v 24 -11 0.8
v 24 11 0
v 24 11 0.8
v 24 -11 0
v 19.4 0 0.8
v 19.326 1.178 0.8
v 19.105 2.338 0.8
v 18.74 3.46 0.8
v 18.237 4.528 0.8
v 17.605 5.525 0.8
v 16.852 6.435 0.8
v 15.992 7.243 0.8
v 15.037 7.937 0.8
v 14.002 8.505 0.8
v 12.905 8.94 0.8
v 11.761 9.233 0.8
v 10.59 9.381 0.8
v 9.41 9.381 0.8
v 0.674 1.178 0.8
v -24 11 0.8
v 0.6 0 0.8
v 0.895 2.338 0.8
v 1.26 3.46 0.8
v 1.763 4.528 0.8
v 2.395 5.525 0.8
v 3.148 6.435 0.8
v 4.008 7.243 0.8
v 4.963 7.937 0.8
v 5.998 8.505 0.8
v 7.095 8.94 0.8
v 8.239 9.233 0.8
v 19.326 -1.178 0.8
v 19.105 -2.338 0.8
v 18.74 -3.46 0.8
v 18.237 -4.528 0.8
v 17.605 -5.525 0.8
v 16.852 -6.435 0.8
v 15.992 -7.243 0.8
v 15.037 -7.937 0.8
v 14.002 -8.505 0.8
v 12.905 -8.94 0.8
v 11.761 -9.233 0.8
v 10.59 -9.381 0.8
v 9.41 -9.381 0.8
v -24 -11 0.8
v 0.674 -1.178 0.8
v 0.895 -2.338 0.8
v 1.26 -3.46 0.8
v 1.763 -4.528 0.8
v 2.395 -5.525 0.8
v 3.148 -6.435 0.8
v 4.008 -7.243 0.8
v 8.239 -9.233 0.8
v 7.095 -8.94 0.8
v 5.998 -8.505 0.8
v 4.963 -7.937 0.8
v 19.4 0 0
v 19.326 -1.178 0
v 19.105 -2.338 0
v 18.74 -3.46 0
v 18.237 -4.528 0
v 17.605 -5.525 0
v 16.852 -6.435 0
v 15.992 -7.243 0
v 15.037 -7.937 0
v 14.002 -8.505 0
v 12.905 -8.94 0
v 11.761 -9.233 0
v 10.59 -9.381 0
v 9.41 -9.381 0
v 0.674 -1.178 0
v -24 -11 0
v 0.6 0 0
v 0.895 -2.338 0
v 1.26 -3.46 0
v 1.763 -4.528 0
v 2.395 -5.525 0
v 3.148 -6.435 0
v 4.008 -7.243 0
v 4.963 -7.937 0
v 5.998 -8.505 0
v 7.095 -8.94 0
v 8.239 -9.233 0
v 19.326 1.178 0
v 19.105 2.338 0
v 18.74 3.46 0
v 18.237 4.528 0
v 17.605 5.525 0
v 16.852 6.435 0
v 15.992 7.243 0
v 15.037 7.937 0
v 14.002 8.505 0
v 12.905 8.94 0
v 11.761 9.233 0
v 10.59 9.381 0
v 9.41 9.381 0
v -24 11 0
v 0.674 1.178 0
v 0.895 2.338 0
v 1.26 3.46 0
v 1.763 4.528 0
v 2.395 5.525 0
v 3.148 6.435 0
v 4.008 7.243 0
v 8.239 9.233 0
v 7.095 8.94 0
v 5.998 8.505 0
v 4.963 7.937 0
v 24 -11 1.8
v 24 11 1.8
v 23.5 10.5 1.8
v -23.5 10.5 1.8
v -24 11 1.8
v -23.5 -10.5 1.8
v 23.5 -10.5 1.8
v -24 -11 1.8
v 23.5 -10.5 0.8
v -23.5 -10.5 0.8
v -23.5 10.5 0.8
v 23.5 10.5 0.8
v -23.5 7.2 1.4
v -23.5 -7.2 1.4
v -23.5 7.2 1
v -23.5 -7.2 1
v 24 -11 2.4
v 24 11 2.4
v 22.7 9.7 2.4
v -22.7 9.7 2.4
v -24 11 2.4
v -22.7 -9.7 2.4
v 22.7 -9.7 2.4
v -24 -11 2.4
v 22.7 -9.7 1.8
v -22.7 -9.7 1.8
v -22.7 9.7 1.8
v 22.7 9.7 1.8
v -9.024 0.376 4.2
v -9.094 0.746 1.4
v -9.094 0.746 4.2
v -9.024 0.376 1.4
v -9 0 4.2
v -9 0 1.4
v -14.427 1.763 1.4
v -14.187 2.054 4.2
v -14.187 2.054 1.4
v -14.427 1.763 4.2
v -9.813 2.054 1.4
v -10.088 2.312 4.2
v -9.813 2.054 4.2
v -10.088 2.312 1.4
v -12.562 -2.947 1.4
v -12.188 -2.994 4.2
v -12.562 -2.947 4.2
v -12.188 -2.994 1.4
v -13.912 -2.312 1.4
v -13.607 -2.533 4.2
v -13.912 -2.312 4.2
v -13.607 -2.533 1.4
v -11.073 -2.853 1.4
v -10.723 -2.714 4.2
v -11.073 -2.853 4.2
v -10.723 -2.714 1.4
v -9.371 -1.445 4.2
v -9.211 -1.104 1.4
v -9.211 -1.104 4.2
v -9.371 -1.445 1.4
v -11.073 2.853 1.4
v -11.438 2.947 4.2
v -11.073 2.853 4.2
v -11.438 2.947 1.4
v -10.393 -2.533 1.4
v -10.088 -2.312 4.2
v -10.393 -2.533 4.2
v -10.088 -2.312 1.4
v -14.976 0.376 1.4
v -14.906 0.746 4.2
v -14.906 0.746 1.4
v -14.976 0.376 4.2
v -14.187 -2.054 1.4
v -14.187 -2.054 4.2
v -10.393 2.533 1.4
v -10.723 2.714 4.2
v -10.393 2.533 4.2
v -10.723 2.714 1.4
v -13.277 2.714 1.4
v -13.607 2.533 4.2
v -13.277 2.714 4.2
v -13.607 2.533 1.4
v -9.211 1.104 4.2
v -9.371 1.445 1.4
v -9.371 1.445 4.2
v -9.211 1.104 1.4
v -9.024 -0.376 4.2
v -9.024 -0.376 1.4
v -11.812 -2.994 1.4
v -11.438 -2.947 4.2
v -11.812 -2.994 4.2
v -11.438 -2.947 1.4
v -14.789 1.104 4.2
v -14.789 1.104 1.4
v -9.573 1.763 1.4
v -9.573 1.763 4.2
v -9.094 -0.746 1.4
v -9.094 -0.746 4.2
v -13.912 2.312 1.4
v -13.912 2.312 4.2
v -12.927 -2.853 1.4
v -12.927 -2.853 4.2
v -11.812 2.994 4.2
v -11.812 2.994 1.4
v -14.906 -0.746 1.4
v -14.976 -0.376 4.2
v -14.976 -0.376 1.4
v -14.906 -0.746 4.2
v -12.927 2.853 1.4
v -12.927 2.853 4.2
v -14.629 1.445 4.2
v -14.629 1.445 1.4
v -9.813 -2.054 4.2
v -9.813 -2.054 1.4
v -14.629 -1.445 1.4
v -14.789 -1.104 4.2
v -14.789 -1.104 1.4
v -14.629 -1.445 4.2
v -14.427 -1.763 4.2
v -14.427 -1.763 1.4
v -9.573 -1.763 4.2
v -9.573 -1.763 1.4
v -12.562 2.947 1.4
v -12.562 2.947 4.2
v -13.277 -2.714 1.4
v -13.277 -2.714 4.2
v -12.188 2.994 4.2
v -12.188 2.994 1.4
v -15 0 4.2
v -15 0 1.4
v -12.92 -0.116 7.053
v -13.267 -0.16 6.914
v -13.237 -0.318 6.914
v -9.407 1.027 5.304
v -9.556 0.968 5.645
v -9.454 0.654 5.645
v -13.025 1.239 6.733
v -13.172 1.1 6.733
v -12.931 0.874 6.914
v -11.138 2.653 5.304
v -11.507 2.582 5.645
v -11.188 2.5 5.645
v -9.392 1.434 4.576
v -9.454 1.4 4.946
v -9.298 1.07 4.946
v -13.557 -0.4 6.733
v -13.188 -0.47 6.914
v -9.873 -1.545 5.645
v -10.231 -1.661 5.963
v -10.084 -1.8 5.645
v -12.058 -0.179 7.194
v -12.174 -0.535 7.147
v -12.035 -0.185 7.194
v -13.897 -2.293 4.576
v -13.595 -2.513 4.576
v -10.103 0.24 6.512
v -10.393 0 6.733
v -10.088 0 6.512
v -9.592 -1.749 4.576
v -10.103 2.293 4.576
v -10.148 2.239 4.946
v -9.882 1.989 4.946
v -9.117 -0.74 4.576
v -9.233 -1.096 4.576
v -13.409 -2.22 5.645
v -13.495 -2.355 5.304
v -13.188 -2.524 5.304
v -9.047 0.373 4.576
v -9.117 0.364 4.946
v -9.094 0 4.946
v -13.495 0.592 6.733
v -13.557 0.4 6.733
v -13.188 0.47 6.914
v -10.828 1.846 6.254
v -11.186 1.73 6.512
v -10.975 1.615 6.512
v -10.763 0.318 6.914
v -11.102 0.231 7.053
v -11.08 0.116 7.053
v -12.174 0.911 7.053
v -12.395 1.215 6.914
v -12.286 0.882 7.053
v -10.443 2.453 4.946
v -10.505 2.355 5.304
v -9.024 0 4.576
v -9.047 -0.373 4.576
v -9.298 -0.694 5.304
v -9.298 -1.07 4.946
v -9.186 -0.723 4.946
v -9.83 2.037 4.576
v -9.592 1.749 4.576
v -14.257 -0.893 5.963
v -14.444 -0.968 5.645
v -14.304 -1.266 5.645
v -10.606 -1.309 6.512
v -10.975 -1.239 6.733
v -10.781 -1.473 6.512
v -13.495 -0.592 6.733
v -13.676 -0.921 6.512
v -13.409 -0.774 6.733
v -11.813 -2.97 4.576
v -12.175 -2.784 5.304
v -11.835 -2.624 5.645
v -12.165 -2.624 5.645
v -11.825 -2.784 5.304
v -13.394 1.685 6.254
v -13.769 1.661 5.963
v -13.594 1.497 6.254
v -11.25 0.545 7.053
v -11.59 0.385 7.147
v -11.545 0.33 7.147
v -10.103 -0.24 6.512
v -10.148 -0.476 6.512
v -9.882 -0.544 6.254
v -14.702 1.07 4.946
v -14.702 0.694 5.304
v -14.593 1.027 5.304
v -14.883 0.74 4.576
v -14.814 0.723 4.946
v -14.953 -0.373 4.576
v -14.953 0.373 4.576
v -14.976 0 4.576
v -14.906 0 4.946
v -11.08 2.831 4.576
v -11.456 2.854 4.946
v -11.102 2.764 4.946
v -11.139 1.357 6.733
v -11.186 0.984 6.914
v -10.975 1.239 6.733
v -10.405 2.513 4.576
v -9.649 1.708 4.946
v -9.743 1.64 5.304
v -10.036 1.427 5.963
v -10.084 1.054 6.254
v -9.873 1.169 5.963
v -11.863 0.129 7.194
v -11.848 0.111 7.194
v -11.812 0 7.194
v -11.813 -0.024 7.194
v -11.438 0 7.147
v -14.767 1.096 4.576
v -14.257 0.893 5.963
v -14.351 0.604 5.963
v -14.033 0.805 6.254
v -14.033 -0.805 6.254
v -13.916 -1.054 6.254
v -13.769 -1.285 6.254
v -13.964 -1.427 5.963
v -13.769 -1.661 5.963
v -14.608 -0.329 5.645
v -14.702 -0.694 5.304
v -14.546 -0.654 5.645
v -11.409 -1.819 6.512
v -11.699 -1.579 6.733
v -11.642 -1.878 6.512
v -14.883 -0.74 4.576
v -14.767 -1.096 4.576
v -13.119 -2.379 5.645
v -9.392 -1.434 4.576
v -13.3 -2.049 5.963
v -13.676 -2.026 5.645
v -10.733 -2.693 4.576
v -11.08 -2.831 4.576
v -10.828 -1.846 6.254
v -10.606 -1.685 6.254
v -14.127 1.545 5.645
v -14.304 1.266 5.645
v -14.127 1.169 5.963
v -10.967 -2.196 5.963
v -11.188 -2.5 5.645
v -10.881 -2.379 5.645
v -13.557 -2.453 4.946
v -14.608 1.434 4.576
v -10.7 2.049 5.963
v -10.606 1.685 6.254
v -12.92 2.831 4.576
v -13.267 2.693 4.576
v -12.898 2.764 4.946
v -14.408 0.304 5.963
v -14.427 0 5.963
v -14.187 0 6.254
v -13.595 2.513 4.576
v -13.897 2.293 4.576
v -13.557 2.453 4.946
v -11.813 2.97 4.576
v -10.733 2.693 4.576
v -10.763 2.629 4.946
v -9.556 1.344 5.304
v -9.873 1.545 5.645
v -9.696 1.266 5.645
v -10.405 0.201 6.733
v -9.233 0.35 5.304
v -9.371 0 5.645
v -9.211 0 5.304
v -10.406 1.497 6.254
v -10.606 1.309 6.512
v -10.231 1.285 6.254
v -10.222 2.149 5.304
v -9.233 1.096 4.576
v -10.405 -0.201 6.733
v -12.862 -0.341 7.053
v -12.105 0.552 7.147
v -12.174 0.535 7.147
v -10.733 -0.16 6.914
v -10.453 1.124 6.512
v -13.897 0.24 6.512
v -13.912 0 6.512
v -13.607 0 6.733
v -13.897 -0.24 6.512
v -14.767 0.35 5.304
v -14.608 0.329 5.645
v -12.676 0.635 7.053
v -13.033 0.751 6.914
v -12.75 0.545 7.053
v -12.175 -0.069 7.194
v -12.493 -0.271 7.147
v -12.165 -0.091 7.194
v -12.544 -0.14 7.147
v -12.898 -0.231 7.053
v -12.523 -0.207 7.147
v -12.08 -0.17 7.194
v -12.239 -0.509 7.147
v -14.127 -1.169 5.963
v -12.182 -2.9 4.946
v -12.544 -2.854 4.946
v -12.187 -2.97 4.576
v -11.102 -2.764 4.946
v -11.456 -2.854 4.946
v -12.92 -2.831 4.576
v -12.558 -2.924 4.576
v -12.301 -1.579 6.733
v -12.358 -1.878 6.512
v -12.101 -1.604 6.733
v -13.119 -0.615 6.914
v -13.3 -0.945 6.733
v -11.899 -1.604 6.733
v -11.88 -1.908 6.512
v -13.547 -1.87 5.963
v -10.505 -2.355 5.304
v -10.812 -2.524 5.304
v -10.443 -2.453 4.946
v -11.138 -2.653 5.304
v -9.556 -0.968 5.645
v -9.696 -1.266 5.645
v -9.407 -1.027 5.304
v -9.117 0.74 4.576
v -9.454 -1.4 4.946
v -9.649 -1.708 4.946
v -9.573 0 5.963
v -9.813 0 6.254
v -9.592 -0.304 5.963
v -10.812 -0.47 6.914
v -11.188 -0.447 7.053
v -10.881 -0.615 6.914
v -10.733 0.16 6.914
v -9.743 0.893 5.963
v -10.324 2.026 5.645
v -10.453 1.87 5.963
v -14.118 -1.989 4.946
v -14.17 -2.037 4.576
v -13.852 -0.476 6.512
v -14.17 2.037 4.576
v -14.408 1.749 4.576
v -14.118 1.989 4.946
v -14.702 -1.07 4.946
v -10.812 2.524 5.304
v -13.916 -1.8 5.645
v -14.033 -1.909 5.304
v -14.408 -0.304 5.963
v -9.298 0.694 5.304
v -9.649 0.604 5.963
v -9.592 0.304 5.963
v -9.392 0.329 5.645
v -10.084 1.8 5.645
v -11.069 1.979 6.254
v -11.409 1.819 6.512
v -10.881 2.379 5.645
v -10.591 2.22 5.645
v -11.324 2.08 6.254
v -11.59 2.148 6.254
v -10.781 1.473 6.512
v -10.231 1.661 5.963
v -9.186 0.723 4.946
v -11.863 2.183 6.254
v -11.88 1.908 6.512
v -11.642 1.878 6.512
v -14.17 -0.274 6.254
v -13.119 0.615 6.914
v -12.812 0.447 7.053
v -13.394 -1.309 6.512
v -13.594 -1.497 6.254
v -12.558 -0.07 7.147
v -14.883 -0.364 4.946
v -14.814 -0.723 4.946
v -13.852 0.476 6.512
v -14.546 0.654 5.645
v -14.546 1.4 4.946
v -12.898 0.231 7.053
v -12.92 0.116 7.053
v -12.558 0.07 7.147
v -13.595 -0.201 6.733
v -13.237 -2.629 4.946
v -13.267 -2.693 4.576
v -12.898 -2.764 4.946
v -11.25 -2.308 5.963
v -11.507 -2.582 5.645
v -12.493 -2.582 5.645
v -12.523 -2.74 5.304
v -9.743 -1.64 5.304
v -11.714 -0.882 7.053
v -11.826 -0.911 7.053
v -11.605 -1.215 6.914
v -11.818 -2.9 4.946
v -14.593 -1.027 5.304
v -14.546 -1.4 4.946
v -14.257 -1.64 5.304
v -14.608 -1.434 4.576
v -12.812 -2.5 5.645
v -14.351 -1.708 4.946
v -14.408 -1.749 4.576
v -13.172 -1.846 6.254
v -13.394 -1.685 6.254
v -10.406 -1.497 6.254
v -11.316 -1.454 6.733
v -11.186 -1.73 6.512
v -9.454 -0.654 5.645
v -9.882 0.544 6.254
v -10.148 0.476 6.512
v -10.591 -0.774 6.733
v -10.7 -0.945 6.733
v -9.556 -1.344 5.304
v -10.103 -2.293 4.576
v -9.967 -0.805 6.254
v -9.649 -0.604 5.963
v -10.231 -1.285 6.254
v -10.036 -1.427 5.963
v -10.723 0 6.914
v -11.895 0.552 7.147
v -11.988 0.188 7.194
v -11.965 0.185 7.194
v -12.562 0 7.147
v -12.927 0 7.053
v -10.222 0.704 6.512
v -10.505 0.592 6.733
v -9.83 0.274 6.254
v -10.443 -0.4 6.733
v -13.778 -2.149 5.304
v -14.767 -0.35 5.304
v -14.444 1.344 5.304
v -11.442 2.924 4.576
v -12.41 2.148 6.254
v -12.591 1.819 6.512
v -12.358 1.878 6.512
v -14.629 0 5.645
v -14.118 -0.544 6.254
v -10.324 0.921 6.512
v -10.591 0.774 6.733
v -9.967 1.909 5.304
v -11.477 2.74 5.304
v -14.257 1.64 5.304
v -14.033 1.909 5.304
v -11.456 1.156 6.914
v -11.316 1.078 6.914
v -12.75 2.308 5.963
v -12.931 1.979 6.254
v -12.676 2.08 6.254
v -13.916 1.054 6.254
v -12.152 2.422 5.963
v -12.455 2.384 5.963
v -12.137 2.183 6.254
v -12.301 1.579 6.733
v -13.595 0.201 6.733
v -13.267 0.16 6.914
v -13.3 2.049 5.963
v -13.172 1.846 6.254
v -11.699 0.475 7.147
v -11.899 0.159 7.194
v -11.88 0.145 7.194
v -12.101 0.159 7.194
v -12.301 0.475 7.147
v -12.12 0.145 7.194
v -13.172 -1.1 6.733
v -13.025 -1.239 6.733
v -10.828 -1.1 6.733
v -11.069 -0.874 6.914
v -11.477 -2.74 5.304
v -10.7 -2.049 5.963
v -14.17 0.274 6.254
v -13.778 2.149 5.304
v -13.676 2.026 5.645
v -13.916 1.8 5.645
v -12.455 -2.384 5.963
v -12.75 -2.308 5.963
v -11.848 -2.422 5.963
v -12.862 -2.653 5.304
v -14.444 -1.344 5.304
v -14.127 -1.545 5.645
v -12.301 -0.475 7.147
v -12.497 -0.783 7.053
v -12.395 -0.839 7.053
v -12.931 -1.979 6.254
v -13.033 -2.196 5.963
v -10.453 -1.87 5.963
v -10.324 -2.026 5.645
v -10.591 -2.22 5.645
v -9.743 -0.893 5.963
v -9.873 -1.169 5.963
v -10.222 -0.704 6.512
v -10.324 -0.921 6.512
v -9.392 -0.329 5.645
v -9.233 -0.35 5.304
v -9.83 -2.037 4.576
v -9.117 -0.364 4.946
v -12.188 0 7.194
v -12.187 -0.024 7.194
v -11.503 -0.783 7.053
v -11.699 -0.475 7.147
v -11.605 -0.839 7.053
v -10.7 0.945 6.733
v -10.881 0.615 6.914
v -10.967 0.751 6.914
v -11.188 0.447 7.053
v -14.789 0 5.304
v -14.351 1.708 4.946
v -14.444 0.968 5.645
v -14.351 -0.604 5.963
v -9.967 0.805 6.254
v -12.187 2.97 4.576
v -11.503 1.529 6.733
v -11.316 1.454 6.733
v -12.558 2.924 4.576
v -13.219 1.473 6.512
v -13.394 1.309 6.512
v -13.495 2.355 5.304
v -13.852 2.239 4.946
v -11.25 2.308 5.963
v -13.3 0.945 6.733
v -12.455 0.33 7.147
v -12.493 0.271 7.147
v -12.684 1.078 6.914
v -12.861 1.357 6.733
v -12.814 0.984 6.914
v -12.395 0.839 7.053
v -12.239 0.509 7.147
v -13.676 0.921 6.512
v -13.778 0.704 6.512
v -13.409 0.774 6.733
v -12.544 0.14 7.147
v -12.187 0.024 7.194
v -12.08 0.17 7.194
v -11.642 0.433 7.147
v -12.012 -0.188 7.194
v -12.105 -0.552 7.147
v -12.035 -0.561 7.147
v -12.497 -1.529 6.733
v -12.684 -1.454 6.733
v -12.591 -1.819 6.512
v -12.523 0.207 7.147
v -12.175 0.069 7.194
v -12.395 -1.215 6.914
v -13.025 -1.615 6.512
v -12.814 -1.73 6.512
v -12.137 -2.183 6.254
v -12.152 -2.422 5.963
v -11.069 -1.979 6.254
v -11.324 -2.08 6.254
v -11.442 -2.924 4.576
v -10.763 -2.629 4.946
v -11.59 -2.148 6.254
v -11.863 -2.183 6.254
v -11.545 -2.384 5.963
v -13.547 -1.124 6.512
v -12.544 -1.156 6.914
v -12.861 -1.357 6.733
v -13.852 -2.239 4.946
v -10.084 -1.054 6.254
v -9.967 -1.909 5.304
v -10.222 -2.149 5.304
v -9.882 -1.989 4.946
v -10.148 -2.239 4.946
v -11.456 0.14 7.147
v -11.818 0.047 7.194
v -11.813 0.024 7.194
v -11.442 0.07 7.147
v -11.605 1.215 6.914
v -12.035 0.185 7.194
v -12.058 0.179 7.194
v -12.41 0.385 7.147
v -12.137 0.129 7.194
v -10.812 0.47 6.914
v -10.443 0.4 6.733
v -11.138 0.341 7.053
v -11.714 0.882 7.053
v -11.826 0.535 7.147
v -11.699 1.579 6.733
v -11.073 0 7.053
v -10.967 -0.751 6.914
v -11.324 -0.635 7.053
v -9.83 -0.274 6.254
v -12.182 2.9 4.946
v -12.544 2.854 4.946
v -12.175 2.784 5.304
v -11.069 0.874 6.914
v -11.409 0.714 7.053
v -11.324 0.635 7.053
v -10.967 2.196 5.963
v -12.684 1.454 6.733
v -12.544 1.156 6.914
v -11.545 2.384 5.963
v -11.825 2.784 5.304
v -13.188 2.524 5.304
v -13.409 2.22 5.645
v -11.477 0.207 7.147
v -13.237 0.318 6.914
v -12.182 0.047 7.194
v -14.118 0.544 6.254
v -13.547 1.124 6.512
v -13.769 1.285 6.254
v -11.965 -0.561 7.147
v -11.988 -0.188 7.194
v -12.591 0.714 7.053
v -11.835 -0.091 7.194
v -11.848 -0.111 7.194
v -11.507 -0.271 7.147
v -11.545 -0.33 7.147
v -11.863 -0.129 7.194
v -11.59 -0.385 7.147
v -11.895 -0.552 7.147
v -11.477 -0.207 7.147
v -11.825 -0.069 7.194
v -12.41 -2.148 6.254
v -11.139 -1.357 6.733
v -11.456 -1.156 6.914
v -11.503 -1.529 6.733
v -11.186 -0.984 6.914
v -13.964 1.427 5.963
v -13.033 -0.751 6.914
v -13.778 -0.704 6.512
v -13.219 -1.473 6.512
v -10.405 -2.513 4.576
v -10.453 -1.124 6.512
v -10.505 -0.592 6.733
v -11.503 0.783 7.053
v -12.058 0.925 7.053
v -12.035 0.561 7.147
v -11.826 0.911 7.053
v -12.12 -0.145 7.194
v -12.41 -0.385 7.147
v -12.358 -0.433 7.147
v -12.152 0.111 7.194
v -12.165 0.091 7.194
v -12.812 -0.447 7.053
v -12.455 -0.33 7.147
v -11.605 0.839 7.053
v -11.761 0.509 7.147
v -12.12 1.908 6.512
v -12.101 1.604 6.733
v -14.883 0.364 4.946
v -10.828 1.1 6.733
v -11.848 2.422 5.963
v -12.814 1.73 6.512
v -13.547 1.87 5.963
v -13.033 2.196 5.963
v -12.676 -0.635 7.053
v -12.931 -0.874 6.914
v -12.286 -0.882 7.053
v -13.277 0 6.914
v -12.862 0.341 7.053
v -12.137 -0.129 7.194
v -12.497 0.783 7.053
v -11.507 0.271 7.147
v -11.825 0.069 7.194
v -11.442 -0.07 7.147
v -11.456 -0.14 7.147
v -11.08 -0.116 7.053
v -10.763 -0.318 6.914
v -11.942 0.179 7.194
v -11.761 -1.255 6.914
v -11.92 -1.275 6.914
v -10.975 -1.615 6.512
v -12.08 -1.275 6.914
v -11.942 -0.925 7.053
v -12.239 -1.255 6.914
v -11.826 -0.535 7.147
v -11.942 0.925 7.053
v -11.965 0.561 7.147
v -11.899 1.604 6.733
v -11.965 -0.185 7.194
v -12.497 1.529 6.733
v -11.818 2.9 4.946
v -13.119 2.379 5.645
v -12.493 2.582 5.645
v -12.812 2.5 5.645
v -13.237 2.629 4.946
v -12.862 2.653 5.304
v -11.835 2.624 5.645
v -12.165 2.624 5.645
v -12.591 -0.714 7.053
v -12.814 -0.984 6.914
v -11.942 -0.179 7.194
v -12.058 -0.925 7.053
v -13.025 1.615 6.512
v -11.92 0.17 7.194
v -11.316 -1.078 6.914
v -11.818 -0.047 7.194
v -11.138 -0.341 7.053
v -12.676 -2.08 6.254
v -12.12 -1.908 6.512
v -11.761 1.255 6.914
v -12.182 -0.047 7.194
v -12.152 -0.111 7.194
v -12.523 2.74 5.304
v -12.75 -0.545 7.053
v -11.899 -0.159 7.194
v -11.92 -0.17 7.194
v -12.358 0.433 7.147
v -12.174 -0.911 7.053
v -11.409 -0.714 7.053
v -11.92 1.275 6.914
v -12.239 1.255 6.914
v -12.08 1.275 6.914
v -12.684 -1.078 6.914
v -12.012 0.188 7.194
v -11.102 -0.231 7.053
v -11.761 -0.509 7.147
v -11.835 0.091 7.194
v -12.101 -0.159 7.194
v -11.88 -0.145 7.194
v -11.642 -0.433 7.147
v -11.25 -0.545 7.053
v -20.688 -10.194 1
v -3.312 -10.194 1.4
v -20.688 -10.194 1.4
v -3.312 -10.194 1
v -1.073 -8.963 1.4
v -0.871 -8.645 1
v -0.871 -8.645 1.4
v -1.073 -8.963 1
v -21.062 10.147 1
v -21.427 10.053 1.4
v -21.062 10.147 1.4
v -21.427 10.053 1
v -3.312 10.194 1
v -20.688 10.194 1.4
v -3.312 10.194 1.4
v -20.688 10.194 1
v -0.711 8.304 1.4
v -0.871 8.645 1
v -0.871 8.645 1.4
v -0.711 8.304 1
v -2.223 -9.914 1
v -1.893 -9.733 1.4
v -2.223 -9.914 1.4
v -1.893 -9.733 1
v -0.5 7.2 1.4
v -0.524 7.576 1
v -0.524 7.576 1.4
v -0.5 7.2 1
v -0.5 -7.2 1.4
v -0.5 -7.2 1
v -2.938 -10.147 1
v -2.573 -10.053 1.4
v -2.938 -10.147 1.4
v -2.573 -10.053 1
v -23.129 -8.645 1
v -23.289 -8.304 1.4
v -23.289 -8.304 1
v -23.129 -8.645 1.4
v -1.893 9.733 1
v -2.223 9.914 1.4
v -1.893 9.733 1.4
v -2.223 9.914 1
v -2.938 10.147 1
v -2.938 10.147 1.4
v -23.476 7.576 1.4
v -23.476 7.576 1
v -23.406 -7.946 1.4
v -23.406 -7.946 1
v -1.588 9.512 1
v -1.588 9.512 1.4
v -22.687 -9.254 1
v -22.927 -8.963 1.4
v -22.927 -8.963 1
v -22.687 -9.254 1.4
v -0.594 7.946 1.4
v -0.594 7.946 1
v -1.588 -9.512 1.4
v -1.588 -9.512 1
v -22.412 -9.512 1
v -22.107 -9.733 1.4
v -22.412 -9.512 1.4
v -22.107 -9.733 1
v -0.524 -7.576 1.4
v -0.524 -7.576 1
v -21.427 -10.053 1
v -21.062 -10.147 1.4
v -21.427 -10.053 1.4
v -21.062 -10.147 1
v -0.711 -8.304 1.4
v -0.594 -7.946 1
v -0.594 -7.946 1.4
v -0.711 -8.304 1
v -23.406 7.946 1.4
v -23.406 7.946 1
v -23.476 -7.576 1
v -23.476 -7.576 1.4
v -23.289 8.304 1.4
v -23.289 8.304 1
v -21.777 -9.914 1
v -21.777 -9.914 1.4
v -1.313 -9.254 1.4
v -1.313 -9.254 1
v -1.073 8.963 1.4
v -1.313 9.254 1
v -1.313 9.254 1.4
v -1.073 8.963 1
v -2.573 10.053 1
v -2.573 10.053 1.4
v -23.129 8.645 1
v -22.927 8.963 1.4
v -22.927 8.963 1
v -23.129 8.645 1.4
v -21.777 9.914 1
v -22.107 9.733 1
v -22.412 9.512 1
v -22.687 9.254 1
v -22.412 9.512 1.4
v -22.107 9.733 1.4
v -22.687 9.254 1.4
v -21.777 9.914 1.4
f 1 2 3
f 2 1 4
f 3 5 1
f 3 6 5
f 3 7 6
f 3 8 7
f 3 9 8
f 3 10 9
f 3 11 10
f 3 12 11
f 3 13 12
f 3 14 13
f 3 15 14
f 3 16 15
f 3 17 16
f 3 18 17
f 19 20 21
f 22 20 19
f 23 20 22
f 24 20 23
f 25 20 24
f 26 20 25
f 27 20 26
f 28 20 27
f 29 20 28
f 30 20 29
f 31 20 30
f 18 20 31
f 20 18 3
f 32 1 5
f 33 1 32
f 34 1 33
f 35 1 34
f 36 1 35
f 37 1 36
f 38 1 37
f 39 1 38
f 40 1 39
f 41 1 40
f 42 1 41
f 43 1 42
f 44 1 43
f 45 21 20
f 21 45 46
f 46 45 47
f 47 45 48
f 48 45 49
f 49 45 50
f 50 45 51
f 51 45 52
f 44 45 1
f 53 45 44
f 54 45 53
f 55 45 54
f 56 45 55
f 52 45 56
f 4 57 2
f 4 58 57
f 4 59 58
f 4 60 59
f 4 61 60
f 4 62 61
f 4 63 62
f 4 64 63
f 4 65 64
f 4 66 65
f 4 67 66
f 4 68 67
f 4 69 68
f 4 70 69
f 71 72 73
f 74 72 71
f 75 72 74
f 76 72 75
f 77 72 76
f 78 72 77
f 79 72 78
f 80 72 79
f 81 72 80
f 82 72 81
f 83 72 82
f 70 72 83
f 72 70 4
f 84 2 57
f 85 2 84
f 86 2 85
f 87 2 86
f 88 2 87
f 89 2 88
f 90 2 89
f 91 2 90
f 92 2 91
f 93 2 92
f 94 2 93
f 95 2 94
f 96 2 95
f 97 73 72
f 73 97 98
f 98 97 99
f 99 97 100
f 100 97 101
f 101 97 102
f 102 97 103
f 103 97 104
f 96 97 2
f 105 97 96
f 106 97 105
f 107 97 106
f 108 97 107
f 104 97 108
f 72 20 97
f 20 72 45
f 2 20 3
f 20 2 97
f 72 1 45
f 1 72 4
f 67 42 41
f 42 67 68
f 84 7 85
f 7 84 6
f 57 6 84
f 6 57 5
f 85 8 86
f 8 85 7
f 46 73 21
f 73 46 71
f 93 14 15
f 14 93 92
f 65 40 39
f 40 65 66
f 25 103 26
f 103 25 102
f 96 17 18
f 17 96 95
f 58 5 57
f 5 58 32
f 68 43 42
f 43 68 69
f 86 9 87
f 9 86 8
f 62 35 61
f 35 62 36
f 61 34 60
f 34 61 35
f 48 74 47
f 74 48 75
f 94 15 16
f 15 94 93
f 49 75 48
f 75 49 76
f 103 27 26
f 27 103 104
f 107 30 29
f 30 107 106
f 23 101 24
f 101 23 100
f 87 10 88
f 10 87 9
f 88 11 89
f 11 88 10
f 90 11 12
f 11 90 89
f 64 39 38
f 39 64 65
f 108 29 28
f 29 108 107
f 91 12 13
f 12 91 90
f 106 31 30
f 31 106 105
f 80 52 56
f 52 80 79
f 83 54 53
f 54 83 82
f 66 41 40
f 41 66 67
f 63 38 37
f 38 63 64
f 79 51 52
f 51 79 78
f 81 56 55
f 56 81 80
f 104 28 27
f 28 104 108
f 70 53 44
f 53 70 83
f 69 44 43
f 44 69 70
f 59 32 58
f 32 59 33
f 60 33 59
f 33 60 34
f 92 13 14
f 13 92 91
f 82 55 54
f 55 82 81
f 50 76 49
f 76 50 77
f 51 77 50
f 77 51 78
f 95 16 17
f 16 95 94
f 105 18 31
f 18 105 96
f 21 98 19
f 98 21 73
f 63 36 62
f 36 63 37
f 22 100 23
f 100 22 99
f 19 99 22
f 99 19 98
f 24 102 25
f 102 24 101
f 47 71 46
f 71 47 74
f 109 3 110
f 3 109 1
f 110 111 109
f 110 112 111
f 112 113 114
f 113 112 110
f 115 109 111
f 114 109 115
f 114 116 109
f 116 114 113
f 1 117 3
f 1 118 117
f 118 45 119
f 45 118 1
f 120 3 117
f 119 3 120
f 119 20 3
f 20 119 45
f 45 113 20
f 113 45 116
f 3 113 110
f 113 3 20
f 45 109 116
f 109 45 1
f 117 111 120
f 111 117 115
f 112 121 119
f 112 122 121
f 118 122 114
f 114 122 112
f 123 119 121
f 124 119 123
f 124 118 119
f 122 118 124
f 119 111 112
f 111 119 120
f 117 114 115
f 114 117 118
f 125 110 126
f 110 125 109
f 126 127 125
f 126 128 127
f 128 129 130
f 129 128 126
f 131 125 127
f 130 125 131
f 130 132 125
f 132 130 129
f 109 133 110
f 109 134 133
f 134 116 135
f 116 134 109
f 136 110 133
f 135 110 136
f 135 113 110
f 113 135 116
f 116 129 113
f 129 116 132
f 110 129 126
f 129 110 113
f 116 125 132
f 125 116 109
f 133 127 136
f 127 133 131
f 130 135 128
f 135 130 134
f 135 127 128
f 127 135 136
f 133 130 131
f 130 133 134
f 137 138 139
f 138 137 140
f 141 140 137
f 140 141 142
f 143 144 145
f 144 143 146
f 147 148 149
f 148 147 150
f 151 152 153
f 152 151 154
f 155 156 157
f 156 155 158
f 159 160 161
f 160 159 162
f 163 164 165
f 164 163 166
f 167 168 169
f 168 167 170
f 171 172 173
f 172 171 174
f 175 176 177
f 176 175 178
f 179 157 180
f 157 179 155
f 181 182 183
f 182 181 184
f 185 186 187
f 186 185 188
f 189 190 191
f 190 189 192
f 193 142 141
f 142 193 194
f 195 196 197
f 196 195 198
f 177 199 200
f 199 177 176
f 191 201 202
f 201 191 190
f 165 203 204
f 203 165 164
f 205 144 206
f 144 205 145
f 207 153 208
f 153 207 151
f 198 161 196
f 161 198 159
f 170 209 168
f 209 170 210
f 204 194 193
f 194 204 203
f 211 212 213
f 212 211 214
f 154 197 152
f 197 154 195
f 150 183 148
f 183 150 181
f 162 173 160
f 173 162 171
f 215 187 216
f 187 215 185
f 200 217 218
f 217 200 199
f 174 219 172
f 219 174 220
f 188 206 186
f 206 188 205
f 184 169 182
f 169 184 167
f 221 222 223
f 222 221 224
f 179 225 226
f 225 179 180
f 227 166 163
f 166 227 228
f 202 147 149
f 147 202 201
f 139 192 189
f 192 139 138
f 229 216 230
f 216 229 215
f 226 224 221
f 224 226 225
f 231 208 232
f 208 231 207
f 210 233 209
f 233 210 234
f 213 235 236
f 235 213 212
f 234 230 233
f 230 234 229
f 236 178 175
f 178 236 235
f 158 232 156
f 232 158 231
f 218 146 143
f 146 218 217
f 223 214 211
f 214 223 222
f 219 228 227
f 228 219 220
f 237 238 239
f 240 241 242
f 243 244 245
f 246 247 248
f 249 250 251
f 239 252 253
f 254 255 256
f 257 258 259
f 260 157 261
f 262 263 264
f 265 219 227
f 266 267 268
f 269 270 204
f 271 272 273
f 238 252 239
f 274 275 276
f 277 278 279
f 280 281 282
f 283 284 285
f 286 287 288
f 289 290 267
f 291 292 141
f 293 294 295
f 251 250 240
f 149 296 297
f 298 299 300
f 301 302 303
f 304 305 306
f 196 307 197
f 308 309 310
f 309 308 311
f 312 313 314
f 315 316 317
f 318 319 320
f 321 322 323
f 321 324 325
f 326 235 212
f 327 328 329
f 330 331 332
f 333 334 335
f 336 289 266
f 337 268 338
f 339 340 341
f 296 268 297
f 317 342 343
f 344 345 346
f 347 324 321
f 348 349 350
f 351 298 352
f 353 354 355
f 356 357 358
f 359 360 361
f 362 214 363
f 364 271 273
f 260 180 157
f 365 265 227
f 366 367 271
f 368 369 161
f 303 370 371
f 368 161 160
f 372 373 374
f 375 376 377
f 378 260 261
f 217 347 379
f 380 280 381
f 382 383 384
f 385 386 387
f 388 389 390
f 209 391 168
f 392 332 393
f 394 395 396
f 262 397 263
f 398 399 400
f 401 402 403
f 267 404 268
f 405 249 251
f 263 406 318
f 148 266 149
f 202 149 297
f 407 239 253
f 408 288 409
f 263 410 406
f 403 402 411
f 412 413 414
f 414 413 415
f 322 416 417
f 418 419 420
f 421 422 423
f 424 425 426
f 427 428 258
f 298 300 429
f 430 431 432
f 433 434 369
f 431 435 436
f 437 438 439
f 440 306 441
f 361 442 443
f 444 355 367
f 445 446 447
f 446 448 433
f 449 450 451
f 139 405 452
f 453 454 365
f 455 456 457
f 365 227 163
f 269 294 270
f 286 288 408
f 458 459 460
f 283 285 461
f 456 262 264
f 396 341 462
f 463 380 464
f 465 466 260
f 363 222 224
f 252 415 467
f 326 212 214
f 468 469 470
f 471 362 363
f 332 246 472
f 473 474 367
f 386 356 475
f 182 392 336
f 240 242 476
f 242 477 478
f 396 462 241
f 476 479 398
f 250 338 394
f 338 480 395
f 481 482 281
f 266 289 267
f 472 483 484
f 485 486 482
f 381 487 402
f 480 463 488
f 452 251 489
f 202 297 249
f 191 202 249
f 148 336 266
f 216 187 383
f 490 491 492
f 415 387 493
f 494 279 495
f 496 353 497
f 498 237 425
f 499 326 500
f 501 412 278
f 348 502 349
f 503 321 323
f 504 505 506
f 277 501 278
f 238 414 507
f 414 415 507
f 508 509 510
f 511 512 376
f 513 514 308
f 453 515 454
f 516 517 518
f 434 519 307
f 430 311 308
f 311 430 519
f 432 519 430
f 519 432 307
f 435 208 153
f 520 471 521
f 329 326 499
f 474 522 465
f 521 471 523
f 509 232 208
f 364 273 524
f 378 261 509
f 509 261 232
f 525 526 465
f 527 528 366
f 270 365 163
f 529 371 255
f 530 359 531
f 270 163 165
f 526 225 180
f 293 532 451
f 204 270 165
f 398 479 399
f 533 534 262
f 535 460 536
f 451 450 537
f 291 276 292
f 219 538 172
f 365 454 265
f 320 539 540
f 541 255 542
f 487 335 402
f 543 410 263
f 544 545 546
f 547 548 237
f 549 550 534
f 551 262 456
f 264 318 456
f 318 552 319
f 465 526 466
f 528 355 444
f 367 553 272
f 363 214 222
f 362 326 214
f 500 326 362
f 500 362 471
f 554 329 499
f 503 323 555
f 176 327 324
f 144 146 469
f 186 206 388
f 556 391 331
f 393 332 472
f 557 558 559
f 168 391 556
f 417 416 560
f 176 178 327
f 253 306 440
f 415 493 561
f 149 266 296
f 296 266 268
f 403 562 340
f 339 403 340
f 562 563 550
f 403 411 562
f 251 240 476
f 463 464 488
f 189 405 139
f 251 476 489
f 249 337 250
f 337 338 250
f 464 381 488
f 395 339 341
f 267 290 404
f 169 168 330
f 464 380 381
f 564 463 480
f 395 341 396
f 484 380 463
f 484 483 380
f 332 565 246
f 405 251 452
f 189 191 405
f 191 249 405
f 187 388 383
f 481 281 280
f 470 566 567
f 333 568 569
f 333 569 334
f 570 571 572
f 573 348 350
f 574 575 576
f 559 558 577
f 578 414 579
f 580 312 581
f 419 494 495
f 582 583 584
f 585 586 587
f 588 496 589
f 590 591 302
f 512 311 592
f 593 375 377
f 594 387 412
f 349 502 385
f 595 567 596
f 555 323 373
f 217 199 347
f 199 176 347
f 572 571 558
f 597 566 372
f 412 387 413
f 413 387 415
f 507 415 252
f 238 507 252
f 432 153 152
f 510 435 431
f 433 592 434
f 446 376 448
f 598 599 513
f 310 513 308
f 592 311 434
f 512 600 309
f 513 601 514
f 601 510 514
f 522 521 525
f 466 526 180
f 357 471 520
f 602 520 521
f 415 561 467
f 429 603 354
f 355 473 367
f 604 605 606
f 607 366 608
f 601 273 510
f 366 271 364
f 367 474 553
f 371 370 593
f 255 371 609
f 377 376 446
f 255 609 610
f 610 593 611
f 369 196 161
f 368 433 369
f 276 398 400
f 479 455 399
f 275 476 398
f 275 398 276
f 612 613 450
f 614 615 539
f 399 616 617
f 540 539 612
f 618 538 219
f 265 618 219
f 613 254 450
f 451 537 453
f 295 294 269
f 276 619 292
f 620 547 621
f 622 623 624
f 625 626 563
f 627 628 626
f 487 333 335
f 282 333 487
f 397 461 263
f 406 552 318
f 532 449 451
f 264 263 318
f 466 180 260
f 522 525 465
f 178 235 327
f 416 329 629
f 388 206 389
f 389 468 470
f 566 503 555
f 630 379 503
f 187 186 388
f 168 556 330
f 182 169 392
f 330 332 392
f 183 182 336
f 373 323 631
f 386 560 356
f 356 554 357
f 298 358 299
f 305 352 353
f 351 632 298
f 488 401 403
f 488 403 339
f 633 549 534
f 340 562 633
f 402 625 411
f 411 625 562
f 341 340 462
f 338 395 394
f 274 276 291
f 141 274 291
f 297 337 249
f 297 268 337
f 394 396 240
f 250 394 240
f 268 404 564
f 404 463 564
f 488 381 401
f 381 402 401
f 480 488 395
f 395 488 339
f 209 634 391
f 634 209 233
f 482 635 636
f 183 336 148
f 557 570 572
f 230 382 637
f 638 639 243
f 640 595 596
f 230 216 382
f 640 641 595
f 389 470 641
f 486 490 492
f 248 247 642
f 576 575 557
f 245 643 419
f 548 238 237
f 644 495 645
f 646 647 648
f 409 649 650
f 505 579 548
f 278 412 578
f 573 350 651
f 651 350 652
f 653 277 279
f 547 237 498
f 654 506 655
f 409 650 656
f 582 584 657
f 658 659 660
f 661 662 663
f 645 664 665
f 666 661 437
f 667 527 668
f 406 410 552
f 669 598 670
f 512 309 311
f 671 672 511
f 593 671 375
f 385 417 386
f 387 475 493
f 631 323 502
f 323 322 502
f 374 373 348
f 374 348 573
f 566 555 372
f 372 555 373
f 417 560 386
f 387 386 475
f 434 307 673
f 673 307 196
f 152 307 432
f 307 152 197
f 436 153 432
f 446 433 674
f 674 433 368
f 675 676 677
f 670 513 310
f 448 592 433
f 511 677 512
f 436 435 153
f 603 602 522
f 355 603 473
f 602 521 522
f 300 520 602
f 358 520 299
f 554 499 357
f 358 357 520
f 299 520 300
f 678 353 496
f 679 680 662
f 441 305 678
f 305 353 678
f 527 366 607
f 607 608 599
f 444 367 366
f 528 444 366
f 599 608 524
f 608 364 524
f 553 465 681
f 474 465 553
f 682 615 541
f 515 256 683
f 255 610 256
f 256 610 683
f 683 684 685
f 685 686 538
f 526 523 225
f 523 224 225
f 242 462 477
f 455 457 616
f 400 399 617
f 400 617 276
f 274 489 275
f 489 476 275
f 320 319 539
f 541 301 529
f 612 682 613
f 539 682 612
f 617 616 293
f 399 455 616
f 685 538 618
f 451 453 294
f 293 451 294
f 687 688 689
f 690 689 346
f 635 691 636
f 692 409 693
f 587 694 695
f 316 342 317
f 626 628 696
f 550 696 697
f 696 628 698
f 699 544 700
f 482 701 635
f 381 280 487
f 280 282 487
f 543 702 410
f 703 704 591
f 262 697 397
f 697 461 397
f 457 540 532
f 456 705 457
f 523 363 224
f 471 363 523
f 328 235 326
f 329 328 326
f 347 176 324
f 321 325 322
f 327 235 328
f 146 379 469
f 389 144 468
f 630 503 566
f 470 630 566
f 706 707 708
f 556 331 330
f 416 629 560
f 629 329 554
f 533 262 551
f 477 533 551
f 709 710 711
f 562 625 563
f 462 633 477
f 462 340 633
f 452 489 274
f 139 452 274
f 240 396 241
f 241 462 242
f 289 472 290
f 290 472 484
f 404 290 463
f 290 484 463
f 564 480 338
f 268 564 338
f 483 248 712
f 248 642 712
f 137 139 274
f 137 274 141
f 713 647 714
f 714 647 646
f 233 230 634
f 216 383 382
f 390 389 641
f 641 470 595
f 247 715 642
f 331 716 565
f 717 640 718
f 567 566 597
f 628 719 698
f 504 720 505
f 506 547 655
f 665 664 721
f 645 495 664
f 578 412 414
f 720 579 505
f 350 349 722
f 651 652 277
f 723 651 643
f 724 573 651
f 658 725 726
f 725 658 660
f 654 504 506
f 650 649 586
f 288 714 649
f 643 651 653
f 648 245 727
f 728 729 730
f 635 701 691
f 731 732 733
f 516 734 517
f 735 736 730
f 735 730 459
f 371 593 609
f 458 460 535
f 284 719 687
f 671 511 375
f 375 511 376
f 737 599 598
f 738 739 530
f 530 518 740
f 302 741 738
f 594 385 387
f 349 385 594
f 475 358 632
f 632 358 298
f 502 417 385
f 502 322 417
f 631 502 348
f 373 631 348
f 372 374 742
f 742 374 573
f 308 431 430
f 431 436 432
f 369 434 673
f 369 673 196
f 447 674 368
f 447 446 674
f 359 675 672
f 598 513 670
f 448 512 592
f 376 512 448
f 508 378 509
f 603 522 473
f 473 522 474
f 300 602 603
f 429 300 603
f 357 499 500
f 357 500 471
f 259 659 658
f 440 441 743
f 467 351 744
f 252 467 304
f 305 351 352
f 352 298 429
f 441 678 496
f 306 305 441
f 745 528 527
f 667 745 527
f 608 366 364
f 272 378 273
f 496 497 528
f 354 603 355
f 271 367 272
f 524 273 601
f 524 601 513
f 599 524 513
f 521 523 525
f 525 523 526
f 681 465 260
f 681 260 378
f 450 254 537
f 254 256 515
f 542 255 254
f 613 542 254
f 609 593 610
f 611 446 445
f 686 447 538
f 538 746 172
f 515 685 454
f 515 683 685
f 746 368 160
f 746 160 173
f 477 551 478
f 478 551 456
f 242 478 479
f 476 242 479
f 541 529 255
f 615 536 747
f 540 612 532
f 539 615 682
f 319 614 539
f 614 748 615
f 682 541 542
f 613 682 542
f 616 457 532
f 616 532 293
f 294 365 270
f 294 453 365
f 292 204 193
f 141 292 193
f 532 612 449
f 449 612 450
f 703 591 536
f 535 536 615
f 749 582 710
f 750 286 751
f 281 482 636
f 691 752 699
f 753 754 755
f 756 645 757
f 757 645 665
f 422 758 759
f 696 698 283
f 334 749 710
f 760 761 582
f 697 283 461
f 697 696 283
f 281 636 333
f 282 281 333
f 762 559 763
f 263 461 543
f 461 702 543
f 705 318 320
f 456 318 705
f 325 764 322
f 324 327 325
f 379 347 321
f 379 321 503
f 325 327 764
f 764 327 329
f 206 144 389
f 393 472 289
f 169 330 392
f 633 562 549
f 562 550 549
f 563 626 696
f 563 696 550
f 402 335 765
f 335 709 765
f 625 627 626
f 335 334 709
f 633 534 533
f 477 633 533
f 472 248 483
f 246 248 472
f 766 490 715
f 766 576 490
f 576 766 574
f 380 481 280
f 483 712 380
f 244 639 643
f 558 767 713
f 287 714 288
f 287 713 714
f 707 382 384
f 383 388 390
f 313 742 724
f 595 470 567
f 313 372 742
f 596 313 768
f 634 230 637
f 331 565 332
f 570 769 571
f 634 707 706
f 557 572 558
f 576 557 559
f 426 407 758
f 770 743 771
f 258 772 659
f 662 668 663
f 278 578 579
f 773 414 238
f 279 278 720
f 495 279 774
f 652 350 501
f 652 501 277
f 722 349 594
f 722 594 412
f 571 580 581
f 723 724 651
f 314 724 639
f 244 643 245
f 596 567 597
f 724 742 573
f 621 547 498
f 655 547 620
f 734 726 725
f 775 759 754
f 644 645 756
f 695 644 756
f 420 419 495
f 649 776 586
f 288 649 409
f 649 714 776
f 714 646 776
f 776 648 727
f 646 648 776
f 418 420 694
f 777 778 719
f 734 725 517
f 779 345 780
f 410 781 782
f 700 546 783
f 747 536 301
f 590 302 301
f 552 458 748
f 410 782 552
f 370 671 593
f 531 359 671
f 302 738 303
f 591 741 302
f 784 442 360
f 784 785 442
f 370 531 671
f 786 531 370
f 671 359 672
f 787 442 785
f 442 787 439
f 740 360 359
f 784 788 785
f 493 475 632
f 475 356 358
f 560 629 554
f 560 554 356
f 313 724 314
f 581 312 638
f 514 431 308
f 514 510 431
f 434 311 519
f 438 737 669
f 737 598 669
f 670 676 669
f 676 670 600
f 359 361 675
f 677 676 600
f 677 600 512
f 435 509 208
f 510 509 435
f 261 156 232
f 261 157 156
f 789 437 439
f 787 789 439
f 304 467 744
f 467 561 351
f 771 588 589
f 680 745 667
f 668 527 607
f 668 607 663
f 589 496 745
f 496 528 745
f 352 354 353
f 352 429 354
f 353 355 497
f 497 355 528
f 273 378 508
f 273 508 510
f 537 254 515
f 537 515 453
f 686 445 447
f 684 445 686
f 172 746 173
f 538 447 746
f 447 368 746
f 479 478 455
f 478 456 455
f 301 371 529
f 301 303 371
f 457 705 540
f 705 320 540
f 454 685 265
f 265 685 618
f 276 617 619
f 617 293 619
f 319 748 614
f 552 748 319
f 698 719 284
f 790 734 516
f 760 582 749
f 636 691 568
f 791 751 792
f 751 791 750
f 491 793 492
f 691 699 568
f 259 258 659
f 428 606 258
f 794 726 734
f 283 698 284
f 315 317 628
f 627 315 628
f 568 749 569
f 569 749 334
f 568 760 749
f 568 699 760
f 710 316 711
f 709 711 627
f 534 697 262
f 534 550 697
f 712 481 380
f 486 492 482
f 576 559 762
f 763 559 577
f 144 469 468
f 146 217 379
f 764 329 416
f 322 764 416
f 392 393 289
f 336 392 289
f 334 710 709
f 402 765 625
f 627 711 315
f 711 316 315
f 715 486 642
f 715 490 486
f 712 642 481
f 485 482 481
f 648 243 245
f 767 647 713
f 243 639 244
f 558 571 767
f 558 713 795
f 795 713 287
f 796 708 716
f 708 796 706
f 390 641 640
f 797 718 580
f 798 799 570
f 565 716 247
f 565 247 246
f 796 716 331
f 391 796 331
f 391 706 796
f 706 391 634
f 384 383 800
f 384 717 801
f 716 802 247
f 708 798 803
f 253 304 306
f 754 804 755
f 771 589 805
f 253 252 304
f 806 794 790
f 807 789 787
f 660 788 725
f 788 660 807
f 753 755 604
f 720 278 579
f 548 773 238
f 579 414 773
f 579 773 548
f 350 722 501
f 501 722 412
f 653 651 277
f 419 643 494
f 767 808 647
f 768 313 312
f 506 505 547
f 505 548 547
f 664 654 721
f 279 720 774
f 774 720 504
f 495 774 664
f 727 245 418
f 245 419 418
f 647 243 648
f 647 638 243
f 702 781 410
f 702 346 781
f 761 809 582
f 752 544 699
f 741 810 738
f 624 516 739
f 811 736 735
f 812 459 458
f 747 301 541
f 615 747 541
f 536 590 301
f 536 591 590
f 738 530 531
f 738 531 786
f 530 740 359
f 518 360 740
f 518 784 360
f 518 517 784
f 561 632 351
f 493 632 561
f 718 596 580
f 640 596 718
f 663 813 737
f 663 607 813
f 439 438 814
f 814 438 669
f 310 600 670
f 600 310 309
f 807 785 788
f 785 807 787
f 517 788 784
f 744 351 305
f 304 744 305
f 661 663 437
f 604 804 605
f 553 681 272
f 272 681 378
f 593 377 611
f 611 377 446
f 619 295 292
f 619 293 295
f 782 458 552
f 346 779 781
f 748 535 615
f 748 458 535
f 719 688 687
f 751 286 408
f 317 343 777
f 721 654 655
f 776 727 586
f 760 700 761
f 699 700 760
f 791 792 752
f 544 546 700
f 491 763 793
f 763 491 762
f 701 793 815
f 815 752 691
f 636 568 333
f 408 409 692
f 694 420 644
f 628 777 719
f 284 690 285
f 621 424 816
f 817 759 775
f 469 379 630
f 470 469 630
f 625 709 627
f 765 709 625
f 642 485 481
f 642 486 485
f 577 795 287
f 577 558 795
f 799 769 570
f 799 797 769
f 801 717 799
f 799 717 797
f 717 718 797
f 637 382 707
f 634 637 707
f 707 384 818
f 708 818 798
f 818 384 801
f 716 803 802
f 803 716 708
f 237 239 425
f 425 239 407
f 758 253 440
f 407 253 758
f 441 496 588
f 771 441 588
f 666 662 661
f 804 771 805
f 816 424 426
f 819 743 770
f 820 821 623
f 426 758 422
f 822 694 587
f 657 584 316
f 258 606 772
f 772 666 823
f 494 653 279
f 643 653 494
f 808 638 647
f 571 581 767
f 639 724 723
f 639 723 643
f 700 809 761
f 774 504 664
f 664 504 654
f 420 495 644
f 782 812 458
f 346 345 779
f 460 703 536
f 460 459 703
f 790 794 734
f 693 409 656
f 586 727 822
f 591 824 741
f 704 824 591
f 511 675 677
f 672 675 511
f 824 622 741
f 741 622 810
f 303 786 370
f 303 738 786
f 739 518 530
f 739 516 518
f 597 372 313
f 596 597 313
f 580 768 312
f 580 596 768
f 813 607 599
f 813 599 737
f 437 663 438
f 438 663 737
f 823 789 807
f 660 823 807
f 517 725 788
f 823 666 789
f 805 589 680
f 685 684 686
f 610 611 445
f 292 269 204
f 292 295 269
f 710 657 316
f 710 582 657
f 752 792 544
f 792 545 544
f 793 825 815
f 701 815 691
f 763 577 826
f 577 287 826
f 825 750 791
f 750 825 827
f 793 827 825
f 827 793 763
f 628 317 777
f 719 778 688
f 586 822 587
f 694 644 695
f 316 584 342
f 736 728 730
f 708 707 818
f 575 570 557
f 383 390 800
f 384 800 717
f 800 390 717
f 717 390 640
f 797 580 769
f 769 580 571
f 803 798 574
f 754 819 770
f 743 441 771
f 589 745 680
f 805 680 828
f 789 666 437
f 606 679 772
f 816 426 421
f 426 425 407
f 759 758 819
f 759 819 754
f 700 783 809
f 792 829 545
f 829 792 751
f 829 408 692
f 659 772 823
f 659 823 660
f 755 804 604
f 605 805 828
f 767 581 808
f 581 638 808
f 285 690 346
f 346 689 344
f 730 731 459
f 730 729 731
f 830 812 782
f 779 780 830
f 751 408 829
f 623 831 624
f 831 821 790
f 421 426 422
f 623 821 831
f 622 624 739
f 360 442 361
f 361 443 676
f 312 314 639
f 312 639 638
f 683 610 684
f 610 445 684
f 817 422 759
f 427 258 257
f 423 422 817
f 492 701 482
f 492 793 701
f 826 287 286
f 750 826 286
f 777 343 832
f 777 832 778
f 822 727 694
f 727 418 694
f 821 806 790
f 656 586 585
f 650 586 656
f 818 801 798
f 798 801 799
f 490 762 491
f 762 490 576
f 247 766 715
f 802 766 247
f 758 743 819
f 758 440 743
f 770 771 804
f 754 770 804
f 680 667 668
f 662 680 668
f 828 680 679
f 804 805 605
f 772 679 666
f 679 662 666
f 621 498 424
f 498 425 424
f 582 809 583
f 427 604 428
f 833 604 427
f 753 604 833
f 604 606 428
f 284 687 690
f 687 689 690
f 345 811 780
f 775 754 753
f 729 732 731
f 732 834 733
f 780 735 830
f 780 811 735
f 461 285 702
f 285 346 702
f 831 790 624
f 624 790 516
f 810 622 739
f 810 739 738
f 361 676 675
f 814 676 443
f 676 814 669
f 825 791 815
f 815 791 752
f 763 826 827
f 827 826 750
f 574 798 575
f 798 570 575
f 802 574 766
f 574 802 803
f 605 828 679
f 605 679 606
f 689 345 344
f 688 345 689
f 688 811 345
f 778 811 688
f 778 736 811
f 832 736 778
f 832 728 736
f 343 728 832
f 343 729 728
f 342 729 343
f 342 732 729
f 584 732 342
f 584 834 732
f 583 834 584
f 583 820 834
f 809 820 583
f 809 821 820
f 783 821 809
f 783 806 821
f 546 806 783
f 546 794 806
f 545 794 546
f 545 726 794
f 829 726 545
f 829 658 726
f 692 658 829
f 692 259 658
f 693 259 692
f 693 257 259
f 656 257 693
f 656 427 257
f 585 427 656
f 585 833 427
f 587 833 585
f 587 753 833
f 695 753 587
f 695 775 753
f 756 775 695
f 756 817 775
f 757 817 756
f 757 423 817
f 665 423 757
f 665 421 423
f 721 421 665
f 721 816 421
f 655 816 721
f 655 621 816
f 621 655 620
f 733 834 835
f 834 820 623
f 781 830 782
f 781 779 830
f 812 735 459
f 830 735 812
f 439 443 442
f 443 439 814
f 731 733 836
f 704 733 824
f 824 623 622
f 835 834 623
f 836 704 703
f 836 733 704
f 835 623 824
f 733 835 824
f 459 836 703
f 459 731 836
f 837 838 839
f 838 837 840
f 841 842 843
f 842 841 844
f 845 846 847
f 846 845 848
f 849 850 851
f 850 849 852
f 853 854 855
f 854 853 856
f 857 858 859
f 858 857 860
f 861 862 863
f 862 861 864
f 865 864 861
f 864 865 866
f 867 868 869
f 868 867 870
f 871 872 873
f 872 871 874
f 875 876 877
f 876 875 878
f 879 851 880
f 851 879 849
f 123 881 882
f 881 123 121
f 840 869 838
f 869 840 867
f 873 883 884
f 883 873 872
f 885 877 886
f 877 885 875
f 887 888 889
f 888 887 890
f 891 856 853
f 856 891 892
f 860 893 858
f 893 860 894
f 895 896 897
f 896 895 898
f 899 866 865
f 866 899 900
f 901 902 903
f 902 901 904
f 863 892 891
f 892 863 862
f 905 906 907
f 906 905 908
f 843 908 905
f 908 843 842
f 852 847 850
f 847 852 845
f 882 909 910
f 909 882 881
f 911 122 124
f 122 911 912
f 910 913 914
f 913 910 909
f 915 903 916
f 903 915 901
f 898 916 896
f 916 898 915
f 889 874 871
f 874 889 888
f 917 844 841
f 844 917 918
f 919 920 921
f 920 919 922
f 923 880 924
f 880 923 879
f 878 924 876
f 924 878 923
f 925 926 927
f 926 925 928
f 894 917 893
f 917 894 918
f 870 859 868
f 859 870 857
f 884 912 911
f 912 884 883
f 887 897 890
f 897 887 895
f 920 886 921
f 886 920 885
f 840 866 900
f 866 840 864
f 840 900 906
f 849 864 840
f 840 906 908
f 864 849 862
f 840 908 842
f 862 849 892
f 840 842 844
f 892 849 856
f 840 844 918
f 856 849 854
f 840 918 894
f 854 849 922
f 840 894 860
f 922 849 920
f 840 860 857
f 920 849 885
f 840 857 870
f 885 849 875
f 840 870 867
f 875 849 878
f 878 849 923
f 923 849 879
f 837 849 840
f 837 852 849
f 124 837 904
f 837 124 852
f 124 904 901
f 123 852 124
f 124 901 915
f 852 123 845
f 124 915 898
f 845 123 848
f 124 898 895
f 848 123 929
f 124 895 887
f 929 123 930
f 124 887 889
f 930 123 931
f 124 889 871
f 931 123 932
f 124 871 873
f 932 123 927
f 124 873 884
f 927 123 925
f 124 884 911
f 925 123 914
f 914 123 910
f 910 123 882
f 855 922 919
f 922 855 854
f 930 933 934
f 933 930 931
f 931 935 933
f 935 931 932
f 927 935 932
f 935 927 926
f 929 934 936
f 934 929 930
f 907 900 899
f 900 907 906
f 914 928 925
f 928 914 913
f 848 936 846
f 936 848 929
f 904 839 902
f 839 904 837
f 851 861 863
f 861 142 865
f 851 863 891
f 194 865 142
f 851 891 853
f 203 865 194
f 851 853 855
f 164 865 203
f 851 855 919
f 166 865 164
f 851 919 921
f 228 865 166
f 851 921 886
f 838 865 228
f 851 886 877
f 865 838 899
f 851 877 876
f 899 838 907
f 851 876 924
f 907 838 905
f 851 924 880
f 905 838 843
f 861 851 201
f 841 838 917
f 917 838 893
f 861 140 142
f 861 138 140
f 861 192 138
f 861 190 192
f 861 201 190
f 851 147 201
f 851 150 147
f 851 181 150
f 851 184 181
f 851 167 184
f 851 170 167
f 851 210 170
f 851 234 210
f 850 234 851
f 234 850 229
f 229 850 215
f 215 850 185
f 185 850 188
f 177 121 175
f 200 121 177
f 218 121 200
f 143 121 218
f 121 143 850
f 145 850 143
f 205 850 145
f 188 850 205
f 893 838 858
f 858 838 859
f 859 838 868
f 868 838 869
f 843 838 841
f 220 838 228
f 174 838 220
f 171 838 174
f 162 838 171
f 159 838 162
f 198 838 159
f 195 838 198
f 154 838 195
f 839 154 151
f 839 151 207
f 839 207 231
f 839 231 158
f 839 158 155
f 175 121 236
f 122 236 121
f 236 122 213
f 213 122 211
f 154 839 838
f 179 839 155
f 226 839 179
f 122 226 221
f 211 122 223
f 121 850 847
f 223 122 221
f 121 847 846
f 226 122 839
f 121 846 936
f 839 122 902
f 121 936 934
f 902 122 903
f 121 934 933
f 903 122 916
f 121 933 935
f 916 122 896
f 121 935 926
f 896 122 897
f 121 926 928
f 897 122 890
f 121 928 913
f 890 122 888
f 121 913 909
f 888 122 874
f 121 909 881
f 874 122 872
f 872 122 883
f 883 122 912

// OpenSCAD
// file: Switch.scad
$fn=50;

sliderX=23;
sliderY=20.4;
sliderZ=0.4;
sliderZpos=0;
radius=3;

knobRadius=3;
knobHeight=3;


slider();


module slider(){
    base();
    knob();
}

module base(){
    hull()
    {
        translate([-sliderX/2+radius,-sliderY/2+radius,sliderZpos])
        cylinder(h=sliderZ,r=radius,center=true);
        translate([sliderX/2-radius,-sliderY/2+radius,sliderZpos])
        cylinder(h=sliderZ,r=radius,center=true);
        translate([-sliderX/2+radius,sliderY/2-radius,sliderZpos])
        cylinder(h=sliderZ,r=radius,center=true);
        translate([sliderX/2-radius,sliderY/2-radius,sliderZpos])
        cylinder(h=sliderZ,r=radius,center=true);
    }
}

module knob(){
    translate([0,0,knobHeight/2])
    cylinder(h=knobHeight,r=knobRadius,center=true);

    translate([0,0,knobHeight])
    sphere(r=radius);
}
// file: LensCover.scad
overlap=0.004;
$fn=50;

baseX=48;
baseY=22;
baseZ=0.8;
baseZtop=baseZ;
baseZdelta=baseZ/2;


holeDeltaX=10;
holeDiameter=18.8;
holeHeight=10;

wallX=baseX;
wallY=baseY;
wallZ=1.0;
wallZtop=baseZtop+wallZ;
wallZdelta=baseZtop+wallZ/2;
wallThickness=1;

coverX=baseX;
coverY=baseY;
coverZ=0.6;
coverZtop=wallZtop+coverZ;
coverZdelta=wallZtop+coverZ/2;
coverDelta=2.6;


lensCover();


module lensCover(){
    base();
    wall();
    cover();
}

module base(){
    color("#555555")
    translate([0,0,baseZdelta])
    difference()
    {
        cube([baseX,baseY,baseZ],center=true);
        translate([holeDeltaX,0,0])
        cylinder(h=holeHeight,d=holeDiameter,center=true);
    }
}
    
module wall(){
    color("#dd9900")
    translate([0,0,wallZdelta])
    difference()
    {
        cube([wallX,wallY,wallZ],center=true);
        cube([wallX-wallThickness,wallY-wallThickness,wallZ+overlap*2+10],center=true);
    }
}

module cover(){
    color("#dddddd")
    translate([0,0,coverZdelta])
    difference()
    {
        cube([coverX,coverY,coverZ],center=true);
        cube([coverX-coverDelta,coverY-coverDelta,coverZ+overlap*2],center=true);
    }
}
// main file
use <LensCover.scad>
use <Switch.scad>

lensCover();
color("#004488")
if($t<0.5){
    translate([-12+48*$t,0,1.2])
    slider();
}else{
    translate([-12+48-48*$t,0,1.2])
    slider();
}
